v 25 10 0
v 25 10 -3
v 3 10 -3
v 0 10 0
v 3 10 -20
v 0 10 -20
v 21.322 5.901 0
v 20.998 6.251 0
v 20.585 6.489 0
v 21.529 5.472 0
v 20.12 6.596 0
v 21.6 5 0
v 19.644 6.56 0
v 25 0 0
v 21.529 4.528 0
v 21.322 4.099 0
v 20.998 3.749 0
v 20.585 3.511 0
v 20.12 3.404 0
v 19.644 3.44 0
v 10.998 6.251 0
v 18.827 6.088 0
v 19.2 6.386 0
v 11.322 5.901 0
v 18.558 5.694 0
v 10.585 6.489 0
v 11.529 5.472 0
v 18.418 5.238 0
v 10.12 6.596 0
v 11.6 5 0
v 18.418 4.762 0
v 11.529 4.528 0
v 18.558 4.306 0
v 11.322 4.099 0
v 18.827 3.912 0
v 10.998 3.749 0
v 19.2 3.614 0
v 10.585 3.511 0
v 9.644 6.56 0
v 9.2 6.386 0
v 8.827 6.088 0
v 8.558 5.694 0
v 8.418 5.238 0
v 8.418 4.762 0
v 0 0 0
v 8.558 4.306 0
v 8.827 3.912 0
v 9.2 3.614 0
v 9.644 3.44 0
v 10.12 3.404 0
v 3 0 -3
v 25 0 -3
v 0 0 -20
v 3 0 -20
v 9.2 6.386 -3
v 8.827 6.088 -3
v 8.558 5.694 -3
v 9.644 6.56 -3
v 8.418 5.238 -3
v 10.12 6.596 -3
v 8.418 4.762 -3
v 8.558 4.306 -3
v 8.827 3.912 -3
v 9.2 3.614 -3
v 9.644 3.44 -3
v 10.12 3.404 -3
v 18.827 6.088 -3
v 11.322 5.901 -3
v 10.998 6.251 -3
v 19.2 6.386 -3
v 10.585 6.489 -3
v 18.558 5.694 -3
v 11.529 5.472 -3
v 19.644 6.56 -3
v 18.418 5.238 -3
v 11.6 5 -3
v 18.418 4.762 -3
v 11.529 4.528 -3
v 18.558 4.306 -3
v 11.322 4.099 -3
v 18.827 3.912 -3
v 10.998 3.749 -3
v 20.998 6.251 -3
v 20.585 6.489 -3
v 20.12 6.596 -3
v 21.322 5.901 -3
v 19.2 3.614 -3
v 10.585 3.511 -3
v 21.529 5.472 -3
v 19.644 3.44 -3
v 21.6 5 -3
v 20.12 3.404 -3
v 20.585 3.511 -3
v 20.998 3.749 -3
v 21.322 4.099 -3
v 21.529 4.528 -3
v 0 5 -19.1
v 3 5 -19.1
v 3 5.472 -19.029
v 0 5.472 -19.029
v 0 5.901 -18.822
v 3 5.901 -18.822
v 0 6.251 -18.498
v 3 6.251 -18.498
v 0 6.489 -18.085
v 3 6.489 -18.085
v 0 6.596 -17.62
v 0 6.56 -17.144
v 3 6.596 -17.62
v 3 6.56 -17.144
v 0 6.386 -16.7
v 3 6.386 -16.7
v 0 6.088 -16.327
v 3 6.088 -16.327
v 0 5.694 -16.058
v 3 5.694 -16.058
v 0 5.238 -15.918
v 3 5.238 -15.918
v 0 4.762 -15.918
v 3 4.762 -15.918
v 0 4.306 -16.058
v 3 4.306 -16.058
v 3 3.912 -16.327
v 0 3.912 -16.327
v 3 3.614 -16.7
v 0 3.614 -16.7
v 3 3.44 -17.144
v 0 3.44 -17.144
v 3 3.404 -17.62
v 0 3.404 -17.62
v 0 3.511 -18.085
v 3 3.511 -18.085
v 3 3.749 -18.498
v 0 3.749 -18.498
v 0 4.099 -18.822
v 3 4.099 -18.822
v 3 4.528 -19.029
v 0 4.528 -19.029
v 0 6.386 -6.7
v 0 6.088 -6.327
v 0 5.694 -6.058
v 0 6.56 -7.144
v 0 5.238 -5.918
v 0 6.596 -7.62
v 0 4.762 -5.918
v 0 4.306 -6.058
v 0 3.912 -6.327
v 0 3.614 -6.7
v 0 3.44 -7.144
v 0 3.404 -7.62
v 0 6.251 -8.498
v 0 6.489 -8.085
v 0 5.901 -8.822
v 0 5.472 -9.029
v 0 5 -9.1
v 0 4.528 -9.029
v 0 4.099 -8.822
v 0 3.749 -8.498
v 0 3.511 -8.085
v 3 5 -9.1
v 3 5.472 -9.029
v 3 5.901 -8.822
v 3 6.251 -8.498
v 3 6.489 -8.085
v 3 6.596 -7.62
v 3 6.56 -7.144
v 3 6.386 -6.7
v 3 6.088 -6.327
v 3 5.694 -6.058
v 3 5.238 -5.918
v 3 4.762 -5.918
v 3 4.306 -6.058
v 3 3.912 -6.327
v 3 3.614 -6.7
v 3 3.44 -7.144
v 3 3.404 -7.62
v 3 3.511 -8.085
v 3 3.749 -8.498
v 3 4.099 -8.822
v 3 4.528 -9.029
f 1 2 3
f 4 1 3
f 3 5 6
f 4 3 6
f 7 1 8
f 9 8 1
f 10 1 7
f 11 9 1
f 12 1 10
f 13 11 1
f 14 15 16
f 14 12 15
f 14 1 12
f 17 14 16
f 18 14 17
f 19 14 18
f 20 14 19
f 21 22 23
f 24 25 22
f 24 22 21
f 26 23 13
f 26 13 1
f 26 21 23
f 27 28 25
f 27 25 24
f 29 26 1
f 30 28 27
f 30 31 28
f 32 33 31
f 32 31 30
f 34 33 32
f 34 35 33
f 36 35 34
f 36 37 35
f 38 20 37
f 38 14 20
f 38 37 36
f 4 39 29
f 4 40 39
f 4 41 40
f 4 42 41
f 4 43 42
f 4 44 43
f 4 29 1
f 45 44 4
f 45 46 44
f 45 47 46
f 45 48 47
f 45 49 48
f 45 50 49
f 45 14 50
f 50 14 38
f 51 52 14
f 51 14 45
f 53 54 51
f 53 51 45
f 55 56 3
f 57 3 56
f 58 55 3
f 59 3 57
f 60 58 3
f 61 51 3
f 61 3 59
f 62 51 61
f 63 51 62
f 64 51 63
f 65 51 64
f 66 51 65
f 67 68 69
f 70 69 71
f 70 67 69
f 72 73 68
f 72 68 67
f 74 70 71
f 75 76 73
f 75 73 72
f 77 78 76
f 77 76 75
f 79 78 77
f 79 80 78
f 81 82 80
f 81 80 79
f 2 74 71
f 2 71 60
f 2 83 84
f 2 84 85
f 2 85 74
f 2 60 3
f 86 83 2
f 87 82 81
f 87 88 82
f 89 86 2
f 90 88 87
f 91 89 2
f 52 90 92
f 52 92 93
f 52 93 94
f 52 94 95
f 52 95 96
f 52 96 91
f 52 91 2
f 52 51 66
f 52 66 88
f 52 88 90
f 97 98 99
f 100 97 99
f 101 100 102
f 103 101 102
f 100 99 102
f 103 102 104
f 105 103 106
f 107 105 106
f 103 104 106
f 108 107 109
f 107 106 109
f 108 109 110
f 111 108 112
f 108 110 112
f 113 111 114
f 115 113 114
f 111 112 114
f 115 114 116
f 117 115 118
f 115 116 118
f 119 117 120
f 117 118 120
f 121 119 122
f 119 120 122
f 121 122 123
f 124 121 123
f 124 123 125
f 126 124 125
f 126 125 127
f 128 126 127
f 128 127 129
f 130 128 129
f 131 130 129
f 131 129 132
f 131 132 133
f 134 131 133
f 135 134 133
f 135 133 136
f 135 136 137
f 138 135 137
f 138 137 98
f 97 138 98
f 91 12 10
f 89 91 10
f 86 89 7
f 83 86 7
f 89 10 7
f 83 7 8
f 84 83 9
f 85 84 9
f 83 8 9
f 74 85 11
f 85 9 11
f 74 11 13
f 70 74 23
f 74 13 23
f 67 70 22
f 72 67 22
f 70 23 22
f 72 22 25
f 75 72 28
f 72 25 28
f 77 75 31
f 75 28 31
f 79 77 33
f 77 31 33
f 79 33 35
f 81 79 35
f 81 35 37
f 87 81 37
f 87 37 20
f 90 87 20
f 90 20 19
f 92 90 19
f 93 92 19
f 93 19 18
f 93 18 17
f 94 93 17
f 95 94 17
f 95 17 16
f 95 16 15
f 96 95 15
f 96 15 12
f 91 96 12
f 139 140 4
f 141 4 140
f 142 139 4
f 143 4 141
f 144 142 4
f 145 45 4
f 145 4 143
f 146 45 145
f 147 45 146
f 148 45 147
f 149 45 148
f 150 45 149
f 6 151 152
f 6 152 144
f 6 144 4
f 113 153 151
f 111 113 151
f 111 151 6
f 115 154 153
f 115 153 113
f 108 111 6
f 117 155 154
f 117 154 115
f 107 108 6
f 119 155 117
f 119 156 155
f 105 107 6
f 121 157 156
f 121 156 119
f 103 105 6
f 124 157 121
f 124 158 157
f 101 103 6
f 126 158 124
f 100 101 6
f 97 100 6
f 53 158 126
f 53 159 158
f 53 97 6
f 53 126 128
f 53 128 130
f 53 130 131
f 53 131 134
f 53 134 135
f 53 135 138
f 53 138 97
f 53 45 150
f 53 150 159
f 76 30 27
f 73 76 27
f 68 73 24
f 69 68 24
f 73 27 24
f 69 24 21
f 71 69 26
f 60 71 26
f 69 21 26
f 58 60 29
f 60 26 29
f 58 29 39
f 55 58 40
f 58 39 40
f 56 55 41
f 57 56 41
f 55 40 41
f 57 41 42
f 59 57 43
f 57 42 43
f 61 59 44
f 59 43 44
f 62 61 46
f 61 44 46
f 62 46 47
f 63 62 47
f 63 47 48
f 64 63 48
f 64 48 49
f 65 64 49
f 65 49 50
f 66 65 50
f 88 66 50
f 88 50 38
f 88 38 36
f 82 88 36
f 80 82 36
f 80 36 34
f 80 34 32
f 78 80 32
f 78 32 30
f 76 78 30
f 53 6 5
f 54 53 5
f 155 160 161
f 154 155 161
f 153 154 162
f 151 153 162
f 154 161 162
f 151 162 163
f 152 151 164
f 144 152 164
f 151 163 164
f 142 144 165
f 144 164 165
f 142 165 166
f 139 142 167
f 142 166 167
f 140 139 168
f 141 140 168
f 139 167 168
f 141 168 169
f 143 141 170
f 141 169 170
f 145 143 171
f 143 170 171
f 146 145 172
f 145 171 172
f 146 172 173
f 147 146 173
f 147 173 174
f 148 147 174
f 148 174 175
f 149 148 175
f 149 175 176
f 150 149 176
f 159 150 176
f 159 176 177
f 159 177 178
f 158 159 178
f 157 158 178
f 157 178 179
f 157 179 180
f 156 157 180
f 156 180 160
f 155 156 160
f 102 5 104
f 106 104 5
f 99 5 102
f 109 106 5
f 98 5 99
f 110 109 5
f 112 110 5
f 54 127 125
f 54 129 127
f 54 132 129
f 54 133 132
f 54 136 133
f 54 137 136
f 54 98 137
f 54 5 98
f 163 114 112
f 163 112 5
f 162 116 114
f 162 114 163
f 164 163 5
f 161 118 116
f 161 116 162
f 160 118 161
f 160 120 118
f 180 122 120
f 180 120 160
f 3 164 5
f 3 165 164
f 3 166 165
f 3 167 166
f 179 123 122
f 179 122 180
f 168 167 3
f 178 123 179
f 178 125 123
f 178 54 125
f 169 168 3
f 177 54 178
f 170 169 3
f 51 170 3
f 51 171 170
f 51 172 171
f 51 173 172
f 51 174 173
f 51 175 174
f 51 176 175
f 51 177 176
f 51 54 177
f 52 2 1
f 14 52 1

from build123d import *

# Parameters (mm, degrees)
BOSS_EXTRUDE2_DEPTH = 10
SKETCH2_R           = 1.6
CUT_EXTRUDE1_DEPTH  = 10
SKETCH3_R           = 1.6
CUT_EXTRUDE2_DEPTH  = 10


with BuildPart() as part:
    # Sketch1 → Boss-Extrude2 (new body)
    with BuildSketch(Plane(origin=(0, 0, 0), x_dir=(1, 0, 0), z_dir=(0, 1, 0))):
        Polygon((0, 0), (0, 20), (3, 20), (3, 3), (25, 3), (25, 0), align=None)
    extrude(amount=BOSS_EXTRUDE2_DEPTH)

    # Sketch2 → Cut-Extrude1 (cut)
    with BuildSketch(Plane.XY):
        with Locations((20, 5)):
            Circle(SKETCH2_R)
        with Locations((10, 5)):
            Circle(SKETCH2_R)
    extrude(amount=-CUT_EXTRUDE1_DEPTH, mode=Mode.SUBTRACT)

    # Sketch3 → Cut-Extrude2 (cut)
    with BuildSketch(Plane(origin=(3, 0, 0), x_dir=(0, 0, -1), z_dir=(1, 0, 0))):
        with Locations((7.5, 5)):
            Circle(SKETCH3_R)
        with Locations((17.5, 5)):
            Circle(SKETCH3_R)
    extrude(amount=-CUT_EXTRUDE2_DEPTH, mode=Mode.SUBTRACT)


solid = part.part
